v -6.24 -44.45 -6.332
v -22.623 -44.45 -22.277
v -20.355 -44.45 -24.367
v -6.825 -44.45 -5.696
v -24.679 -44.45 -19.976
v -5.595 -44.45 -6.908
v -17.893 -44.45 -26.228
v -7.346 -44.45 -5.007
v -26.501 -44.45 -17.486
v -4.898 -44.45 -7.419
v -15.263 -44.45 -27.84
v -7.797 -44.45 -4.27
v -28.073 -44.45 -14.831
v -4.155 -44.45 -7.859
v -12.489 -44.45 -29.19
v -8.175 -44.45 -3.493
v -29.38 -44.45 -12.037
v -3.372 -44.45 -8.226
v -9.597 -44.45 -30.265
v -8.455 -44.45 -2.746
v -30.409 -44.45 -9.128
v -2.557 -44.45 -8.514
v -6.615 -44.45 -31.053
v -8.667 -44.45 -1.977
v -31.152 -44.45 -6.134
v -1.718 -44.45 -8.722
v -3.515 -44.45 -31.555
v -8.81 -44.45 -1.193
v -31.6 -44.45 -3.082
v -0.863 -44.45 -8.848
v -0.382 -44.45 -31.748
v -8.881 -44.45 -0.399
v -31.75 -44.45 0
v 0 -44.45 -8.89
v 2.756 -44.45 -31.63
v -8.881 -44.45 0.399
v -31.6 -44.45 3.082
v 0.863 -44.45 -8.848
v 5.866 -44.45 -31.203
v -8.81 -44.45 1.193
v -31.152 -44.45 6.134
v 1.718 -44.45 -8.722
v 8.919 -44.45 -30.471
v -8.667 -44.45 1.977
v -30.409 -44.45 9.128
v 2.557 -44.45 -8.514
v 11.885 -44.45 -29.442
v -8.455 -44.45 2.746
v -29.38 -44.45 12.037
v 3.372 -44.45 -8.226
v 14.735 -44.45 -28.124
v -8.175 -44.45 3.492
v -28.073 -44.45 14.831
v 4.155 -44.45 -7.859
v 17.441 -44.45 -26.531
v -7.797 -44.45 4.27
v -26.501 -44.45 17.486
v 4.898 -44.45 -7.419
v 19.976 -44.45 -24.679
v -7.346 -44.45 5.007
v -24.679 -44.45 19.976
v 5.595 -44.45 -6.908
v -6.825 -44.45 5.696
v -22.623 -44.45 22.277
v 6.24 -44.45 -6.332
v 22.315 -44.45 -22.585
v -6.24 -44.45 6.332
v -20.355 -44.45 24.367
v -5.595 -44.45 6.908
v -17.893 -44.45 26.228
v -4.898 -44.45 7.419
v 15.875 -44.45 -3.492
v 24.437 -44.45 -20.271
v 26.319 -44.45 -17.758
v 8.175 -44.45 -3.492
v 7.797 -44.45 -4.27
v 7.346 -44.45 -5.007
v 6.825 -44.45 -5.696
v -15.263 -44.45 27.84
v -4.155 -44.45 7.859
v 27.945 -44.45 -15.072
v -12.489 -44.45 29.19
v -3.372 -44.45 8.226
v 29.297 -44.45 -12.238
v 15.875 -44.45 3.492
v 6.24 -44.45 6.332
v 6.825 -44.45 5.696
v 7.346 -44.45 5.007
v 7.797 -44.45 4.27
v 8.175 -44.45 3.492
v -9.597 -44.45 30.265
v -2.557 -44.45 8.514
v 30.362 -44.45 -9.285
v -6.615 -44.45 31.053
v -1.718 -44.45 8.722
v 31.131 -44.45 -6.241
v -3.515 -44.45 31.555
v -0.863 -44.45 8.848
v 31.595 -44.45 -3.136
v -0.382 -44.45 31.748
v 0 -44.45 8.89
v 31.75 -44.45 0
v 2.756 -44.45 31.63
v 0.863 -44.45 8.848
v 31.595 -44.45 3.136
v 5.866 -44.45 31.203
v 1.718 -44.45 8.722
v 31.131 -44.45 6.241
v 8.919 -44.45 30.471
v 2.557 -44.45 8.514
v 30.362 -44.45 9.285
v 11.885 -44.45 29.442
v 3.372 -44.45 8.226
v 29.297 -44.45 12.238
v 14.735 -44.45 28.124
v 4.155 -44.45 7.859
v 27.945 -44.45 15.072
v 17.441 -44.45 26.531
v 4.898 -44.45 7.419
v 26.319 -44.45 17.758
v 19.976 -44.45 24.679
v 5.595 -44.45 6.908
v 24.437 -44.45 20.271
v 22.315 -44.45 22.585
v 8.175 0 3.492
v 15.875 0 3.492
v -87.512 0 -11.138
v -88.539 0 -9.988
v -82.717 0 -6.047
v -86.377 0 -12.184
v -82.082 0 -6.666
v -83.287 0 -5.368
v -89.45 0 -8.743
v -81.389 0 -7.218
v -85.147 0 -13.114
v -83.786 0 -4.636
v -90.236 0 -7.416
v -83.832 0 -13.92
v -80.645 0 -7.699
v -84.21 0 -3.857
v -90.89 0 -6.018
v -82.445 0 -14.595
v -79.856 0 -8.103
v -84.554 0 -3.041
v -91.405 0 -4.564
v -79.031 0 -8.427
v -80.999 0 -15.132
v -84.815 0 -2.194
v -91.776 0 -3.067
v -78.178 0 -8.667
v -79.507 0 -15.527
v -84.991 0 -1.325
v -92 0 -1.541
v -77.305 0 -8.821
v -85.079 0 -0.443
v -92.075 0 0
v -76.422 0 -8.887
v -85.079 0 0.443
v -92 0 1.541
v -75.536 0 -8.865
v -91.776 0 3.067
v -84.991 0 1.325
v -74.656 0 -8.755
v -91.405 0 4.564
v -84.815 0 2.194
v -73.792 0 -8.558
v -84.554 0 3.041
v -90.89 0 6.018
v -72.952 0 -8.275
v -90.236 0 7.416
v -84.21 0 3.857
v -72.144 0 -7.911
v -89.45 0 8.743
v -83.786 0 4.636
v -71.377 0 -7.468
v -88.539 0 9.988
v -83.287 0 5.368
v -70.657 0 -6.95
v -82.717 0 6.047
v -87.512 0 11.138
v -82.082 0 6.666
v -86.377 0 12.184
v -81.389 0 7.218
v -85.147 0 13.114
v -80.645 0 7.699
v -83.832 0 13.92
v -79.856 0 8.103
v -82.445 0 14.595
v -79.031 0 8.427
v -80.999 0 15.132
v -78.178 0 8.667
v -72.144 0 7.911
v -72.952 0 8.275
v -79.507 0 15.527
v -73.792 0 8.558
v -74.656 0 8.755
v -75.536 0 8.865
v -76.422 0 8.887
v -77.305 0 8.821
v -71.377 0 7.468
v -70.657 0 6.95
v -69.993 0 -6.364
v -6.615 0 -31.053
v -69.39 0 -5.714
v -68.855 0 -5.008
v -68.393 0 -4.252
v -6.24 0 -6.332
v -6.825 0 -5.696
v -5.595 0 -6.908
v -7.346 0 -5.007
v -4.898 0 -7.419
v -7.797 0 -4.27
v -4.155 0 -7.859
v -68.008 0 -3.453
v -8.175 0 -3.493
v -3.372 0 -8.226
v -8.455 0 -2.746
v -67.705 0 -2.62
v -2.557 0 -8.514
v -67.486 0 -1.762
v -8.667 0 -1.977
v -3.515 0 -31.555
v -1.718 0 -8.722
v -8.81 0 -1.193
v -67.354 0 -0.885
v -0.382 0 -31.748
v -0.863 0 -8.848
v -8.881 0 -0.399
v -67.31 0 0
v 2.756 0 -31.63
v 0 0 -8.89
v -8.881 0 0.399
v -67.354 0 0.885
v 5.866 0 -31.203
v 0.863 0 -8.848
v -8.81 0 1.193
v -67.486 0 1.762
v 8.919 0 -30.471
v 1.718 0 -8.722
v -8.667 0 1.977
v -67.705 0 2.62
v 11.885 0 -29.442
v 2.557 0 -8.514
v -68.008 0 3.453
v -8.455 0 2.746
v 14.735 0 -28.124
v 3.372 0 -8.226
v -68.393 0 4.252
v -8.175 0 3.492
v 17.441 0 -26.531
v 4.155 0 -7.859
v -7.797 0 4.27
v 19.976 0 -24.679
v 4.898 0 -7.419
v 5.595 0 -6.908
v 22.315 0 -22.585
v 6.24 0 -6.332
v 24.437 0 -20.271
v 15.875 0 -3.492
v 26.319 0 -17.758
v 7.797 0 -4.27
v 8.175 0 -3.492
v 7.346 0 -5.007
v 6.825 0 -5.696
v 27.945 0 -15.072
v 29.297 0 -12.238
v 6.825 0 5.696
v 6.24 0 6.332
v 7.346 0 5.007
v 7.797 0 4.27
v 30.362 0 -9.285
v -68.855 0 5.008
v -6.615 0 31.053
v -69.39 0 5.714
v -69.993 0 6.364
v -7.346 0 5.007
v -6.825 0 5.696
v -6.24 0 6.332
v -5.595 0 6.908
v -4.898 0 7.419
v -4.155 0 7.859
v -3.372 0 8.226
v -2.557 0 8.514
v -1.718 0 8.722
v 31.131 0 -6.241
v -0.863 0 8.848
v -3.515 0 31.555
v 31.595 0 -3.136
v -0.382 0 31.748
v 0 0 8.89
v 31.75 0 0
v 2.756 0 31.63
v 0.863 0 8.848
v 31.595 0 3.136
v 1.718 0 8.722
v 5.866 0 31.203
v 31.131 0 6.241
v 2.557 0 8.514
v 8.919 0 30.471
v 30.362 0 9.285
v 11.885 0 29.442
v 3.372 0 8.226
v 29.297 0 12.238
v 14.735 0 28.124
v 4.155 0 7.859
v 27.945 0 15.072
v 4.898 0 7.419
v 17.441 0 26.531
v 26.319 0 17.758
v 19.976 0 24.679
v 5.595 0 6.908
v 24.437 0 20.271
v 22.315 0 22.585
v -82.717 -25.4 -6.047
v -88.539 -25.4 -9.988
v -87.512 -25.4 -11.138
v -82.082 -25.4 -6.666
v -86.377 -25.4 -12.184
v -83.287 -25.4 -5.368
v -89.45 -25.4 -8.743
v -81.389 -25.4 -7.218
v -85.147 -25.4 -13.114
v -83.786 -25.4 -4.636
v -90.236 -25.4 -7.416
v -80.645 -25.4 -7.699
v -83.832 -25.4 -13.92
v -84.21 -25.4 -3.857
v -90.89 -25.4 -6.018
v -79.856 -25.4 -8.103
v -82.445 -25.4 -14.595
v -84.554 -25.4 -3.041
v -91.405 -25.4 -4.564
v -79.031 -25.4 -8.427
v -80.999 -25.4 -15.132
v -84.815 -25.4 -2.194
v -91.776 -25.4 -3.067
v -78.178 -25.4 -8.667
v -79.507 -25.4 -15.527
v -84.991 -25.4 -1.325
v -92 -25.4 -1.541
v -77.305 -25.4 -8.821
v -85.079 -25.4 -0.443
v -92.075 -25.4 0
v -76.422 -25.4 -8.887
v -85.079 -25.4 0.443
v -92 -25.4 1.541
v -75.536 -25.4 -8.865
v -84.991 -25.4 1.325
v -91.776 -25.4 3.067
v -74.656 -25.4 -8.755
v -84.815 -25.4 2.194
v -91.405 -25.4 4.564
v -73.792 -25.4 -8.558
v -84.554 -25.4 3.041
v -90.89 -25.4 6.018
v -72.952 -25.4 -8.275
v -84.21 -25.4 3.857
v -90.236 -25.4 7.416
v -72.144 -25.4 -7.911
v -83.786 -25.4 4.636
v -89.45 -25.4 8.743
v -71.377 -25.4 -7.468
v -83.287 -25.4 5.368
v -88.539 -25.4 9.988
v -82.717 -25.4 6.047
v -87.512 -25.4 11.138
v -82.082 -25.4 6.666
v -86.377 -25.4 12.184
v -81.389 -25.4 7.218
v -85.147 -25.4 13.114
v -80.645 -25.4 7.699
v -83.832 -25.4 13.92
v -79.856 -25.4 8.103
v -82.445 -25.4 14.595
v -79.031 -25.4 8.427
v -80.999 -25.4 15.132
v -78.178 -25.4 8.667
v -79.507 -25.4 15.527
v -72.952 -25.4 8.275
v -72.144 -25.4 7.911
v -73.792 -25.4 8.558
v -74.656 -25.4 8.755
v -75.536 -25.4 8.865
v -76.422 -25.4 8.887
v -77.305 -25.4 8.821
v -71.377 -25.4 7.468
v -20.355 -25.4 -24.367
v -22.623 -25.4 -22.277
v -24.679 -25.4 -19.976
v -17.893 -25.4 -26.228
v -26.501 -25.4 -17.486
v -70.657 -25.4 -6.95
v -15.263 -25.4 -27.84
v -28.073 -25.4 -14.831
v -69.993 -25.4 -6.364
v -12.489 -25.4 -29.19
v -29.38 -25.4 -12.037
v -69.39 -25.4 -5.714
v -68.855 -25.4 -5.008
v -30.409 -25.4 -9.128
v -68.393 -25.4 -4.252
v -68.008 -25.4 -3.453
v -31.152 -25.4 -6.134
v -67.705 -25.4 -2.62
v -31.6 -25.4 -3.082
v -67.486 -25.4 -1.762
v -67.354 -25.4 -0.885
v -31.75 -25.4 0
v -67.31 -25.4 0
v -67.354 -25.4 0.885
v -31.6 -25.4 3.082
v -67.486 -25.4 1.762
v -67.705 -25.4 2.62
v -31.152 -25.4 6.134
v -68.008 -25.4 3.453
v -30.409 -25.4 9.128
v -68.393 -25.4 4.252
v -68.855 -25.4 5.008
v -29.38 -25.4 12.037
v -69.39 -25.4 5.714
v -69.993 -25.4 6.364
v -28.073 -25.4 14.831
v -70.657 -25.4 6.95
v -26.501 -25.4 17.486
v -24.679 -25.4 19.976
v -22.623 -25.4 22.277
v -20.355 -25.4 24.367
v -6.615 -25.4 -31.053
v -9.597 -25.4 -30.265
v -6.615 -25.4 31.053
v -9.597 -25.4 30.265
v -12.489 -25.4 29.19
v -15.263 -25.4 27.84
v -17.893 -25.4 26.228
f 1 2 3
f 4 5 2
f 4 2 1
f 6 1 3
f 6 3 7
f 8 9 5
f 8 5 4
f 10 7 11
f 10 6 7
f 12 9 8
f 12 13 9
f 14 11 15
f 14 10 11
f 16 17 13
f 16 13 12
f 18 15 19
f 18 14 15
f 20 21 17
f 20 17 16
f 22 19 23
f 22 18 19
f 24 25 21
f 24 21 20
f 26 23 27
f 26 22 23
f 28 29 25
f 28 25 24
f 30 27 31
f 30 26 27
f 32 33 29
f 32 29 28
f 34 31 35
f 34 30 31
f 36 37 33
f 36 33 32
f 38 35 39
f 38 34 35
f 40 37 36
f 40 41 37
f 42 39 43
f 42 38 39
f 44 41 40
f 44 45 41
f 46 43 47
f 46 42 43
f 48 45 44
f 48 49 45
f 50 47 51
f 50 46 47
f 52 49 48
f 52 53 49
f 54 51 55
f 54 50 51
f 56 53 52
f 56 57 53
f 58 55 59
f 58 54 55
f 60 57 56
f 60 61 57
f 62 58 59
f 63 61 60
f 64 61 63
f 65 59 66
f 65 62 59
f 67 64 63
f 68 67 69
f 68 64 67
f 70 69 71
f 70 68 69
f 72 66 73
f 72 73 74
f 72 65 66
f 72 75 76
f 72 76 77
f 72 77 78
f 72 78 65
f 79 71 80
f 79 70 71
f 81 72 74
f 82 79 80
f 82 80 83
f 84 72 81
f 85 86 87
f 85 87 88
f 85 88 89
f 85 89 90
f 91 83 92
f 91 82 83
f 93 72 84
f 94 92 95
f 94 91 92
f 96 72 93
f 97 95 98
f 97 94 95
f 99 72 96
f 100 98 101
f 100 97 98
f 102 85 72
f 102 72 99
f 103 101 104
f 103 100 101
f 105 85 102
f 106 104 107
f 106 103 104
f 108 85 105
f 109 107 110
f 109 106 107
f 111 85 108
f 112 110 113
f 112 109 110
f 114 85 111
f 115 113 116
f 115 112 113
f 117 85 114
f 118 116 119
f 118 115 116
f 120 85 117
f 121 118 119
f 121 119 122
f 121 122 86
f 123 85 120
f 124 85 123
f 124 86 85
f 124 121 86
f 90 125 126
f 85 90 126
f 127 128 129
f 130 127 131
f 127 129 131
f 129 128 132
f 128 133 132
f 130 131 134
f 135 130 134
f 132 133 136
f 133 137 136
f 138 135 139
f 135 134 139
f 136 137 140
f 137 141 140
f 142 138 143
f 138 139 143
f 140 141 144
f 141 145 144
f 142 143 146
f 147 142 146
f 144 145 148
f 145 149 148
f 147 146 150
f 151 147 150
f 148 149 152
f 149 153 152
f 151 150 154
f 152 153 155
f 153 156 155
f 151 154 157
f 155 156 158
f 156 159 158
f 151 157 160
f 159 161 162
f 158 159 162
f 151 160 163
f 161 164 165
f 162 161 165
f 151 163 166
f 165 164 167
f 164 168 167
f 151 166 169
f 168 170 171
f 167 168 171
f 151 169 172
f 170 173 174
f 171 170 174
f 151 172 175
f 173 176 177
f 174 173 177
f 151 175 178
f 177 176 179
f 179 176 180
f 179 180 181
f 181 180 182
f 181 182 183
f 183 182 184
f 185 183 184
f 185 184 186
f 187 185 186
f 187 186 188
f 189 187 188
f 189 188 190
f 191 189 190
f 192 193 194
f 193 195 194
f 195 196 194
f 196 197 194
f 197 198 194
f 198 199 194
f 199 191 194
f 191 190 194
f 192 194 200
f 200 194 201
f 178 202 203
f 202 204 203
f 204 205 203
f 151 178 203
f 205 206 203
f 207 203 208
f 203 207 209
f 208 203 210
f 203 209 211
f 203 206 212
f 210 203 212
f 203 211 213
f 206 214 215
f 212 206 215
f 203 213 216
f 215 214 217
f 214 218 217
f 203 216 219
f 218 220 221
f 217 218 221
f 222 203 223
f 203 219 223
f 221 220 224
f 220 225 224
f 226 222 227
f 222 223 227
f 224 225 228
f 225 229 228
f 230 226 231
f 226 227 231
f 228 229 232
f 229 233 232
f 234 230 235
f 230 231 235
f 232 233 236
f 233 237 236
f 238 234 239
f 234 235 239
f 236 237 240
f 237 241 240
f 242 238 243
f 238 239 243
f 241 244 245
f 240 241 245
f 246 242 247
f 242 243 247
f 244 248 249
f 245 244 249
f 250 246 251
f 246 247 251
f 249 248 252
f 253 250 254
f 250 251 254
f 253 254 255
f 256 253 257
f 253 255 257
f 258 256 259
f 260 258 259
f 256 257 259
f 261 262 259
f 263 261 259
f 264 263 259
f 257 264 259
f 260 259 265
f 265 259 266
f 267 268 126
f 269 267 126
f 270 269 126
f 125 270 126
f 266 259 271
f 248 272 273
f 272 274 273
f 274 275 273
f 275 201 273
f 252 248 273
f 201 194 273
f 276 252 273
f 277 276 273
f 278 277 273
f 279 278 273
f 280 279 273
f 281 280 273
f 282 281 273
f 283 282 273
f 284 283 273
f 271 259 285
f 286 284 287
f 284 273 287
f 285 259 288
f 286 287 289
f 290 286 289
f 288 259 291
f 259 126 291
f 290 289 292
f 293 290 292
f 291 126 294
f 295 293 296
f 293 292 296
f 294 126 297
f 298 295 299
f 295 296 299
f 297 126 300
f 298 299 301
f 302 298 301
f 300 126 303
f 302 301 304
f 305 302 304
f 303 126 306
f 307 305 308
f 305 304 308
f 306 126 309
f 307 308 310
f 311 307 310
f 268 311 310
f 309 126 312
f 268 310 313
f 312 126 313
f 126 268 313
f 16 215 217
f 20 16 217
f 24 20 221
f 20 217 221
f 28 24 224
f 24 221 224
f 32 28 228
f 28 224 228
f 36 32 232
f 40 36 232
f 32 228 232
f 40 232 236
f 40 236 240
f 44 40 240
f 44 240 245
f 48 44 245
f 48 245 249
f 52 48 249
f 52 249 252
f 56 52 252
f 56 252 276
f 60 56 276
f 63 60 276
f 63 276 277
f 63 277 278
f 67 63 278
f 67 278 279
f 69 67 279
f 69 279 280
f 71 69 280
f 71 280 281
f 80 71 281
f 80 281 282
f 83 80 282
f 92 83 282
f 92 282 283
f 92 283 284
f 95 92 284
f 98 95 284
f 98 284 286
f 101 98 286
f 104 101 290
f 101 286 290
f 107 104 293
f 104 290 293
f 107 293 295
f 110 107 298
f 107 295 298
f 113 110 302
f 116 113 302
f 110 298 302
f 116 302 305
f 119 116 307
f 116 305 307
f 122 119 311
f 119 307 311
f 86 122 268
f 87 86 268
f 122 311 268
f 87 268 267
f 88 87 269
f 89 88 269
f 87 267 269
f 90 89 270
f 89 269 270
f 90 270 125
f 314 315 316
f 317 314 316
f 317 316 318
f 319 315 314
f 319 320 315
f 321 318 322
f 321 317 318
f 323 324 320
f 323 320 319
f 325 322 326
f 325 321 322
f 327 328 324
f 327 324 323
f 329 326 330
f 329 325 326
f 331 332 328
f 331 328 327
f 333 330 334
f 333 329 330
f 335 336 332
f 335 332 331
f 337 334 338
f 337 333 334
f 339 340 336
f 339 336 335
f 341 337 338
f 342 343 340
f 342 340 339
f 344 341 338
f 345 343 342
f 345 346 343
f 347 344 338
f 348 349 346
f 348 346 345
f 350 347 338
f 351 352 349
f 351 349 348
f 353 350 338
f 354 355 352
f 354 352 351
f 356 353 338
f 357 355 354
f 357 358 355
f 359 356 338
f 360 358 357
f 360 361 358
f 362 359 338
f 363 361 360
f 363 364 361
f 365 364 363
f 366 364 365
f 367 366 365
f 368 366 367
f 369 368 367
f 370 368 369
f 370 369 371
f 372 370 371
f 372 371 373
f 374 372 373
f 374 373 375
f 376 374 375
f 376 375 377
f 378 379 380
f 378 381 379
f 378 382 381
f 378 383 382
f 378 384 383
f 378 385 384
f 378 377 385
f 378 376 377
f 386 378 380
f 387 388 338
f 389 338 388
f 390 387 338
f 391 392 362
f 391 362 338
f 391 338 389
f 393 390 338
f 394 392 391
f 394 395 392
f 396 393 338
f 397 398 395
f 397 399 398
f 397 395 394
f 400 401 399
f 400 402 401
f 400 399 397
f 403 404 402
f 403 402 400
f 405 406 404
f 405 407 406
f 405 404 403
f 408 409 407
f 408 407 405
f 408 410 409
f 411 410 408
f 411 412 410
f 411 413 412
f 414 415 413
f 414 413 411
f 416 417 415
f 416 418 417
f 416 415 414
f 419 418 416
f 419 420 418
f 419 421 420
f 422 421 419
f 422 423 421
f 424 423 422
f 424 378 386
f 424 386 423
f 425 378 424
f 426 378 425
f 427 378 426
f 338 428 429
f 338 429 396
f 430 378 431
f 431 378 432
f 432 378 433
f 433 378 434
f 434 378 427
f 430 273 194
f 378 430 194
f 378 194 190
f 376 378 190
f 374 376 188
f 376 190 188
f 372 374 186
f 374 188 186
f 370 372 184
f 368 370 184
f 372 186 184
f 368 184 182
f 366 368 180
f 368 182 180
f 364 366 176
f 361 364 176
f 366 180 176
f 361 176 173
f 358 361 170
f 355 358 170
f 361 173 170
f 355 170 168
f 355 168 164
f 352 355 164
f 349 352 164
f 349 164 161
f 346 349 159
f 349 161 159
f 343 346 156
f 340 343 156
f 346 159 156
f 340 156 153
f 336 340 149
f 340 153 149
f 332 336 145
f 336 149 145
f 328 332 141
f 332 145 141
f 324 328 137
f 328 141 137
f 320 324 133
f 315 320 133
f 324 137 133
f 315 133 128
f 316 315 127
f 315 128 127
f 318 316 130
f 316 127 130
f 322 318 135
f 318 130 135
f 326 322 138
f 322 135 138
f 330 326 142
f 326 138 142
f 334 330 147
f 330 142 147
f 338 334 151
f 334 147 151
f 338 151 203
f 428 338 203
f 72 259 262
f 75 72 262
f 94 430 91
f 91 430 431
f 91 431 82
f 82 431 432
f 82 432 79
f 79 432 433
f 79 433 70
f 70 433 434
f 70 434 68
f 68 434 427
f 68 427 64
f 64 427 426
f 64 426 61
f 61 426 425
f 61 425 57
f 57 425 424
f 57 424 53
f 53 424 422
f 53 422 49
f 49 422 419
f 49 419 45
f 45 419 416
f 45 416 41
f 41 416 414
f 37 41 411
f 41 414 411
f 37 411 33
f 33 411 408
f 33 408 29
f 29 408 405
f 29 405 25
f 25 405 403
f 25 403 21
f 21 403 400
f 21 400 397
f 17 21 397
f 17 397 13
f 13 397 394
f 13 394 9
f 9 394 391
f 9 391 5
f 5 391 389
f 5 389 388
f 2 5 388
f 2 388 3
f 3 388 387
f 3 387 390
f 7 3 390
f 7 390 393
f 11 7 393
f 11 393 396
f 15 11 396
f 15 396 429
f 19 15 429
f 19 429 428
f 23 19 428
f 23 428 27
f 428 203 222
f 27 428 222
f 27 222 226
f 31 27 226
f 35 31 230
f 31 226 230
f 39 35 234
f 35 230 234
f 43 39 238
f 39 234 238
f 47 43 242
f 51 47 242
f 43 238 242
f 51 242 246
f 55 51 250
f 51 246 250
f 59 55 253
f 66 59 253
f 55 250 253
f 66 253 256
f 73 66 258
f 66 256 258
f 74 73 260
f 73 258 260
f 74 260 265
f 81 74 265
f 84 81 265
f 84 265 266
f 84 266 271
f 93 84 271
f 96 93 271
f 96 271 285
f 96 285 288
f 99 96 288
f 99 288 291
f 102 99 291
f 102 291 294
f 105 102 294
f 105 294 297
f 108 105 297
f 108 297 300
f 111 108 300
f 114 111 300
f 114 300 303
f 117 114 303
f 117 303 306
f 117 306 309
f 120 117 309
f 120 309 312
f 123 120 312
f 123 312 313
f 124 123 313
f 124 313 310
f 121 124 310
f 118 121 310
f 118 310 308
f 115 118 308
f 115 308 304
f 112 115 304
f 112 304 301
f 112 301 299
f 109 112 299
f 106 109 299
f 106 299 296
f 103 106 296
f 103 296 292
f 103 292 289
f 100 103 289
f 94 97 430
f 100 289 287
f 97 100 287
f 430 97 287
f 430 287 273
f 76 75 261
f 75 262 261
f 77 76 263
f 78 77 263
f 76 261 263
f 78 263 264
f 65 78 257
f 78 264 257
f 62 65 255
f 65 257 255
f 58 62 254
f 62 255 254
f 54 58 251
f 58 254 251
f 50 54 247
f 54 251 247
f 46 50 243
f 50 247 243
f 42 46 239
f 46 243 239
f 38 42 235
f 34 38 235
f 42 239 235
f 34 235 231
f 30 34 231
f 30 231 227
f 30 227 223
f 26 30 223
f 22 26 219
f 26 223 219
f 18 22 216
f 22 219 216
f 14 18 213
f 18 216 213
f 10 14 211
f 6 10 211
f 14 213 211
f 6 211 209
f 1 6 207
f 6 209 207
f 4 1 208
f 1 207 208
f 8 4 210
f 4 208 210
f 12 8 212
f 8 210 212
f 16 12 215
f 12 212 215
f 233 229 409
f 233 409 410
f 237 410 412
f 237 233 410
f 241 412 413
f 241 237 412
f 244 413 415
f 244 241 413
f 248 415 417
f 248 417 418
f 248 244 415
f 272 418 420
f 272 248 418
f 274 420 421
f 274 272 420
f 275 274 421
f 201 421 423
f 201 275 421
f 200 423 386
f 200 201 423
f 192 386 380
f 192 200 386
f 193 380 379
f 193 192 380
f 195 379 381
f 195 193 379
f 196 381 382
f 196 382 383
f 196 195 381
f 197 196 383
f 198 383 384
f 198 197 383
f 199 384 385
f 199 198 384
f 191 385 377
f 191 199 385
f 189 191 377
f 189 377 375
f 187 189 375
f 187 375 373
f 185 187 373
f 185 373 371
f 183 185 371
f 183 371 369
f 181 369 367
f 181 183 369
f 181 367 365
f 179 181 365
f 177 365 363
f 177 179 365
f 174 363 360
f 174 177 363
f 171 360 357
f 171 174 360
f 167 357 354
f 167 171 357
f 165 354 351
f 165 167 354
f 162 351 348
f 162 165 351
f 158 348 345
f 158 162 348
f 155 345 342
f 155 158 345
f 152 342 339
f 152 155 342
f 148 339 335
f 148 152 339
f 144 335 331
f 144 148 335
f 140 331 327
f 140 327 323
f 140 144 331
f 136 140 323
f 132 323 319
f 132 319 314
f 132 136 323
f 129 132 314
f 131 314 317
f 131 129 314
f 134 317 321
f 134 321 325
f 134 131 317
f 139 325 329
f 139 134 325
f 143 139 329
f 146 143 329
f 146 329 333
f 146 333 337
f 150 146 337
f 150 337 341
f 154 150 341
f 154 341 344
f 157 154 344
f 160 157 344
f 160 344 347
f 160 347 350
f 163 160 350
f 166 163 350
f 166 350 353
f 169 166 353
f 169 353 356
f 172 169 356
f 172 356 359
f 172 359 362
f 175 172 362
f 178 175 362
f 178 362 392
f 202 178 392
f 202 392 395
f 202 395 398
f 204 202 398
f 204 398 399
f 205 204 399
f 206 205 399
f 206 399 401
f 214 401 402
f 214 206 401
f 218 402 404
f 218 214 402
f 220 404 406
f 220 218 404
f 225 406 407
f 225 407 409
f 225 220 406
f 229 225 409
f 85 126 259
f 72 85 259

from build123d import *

# Parameters (mm, degrees)
F0_R     = 8.89
F1_DEPTH = 25.4
F2_DEPTH = 44.45


with BuildPart() as f1:
    # F0 (on Front) → F1 (new body)
    with BuildSketch(Plane.XZ):
        with BuildLine():
            ThreePointArc((-6.6145833333, -31.0533377808), (19.97560361, -24.6786904113), (31.75, 0))
            ThreePointArc((31.75, 0), (19.97560361, 24.6786904113), (-6.6145833333, 31.0533377808))
            ThreePointArc((-6.6145833333, 31.0533377808), (-31.75, 0), (-6.6145833333, -31.0533377808))
        make_face()
        with BuildLine():
            ThreePointArc((-8.1752396754, 3.4925), (0, 8.89), (8.1752396754, 3.4925))
            Line((8.1752396754, 3.4925), (15.875, 3.4925))
            Line((15.875, 3.4925), (15.875, -3.4925))
            Line((15.875, -3.4925), (8.1752396754, -3.4925))
            ThreePointArc((8.1752396754, -3.4925), (0, -8.89), (-8.1752396754, -3.4925))
            Line((-8.1752396754, -3.4925), (-15.875, -3.4925))
            Line((-15.875, -3.4925), (-15.875, 3.4925))
            Line((-15.875, 3.4925), (-8.1752396754, 3.4925))
        make_face(mode=Mode.SUBTRACT)
        with BuildLine():
            ThreePointArc((-6.6145833333, -31.0533377808), (-31.75, 0), (-6.6145833333, 31.0533377808))
            Line((-6.6145833333, 31.0533377808), (-79.5072916667, 15.5266688904))
            ThreePointArc((-79.5072916667, 15.5266688904), (-66.212198195, 12.3393452056), (-60.325, 0))
            ThreePointArc((-60.325, 0), (-66.212198195, -12.3393452056), (-79.5072916667, -15.5266688904))
            Line((-79.5072916667, -15.5266688904), (-6.6145833333, -31.0533377808))
        make_face()
        with BuildLine():
            ThreePointArc((-60.325, 0), (-66.212198195, 12.3393452056), (-79.5072916667, 15.5266688904))
            ThreePointArc((-79.5072916667, 15.5266688904), (-92.075, 0), (-79.5072916667, -15.5266688904))
            ThreePointArc((-79.5072916667, -15.5266688904), (-66.212198195, -12.3393452056), (-60.325, 0))
        make_face()
        with Locations((-76.2, 0)):
            Circle(F0_R, mode=Mode.SUBTRACT)
        with BuildLine():
            ThreePointArc((-8.1752396754, -3.4925), (-8.89, 0), (-8.1752396754, 3.4925))
            Line((-8.1752396754, 3.4925), (-15.875, 3.4925))
            Line((-15.875, 3.4925), (-15.875, -3.4925))
            Line((-15.875, -3.4925), (-8.1752396754, -3.4925))
        make_face()
    extrude(amount=F1_DEPTH)

    # F0 (on Front) → F2 (join)
    with BuildSketch(Plane.XZ):
        with BuildLine():
            ThreePointArc((-6.6145833333, -31.0533377808), (19.97560361, -24.6786904113), (31.75, 0))
            ThreePointArc((31.75, 0), (19.97560361, 24.6786904113), (-6.6145833333, 31.0533377808))
            ThreePointArc((-6.6145833333, 31.0533377808), (-31.75, 0), (-6.6145833333, -31.0533377808))
        make_face()
        with BuildLine():
            ThreePointArc((-8.1752396754, 3.4925), (0, 8.89), (8.1752396754, 3.4925))
            Line((8.1752396754, 3.4925), (15.875, 3.4925))
            Line((15.875, 3.4925), (15.875, -3.4925))
            Line((15.875, -3.4925), (8.1752396754, -3.4925))
            ThreePointArc((8.1752396754, -3.4925), (0, -8.89), (-8.1752396754, -3.4925))
            Line((-8.1752396754, -3.4925), (-15.875, -3.4925))
            Line((-15.875, -3.4925), (-15.875, 3.4925))
            Line((-15.875, 3.4925), (-8.1752396754, 3.4925))
        make_face(mode=Mode.SUBTRACT)
        with BuildLine():
            ThreePointArc((-8.1752396754, -3.4925), (-8.89, 0), (-8.1752396754, 3.4925))
            Line((-8.1752396754, 3.4925), (-15.875, 3.4925))
            Line((-15.875, 3.4925), (-15.875, -3.4925))
            Line((-15.875, -3.4925), (-8.1752396754, -3.4925))
        make_face()
    extrude(amount=F2_DEPTH)


solid = f1.part
